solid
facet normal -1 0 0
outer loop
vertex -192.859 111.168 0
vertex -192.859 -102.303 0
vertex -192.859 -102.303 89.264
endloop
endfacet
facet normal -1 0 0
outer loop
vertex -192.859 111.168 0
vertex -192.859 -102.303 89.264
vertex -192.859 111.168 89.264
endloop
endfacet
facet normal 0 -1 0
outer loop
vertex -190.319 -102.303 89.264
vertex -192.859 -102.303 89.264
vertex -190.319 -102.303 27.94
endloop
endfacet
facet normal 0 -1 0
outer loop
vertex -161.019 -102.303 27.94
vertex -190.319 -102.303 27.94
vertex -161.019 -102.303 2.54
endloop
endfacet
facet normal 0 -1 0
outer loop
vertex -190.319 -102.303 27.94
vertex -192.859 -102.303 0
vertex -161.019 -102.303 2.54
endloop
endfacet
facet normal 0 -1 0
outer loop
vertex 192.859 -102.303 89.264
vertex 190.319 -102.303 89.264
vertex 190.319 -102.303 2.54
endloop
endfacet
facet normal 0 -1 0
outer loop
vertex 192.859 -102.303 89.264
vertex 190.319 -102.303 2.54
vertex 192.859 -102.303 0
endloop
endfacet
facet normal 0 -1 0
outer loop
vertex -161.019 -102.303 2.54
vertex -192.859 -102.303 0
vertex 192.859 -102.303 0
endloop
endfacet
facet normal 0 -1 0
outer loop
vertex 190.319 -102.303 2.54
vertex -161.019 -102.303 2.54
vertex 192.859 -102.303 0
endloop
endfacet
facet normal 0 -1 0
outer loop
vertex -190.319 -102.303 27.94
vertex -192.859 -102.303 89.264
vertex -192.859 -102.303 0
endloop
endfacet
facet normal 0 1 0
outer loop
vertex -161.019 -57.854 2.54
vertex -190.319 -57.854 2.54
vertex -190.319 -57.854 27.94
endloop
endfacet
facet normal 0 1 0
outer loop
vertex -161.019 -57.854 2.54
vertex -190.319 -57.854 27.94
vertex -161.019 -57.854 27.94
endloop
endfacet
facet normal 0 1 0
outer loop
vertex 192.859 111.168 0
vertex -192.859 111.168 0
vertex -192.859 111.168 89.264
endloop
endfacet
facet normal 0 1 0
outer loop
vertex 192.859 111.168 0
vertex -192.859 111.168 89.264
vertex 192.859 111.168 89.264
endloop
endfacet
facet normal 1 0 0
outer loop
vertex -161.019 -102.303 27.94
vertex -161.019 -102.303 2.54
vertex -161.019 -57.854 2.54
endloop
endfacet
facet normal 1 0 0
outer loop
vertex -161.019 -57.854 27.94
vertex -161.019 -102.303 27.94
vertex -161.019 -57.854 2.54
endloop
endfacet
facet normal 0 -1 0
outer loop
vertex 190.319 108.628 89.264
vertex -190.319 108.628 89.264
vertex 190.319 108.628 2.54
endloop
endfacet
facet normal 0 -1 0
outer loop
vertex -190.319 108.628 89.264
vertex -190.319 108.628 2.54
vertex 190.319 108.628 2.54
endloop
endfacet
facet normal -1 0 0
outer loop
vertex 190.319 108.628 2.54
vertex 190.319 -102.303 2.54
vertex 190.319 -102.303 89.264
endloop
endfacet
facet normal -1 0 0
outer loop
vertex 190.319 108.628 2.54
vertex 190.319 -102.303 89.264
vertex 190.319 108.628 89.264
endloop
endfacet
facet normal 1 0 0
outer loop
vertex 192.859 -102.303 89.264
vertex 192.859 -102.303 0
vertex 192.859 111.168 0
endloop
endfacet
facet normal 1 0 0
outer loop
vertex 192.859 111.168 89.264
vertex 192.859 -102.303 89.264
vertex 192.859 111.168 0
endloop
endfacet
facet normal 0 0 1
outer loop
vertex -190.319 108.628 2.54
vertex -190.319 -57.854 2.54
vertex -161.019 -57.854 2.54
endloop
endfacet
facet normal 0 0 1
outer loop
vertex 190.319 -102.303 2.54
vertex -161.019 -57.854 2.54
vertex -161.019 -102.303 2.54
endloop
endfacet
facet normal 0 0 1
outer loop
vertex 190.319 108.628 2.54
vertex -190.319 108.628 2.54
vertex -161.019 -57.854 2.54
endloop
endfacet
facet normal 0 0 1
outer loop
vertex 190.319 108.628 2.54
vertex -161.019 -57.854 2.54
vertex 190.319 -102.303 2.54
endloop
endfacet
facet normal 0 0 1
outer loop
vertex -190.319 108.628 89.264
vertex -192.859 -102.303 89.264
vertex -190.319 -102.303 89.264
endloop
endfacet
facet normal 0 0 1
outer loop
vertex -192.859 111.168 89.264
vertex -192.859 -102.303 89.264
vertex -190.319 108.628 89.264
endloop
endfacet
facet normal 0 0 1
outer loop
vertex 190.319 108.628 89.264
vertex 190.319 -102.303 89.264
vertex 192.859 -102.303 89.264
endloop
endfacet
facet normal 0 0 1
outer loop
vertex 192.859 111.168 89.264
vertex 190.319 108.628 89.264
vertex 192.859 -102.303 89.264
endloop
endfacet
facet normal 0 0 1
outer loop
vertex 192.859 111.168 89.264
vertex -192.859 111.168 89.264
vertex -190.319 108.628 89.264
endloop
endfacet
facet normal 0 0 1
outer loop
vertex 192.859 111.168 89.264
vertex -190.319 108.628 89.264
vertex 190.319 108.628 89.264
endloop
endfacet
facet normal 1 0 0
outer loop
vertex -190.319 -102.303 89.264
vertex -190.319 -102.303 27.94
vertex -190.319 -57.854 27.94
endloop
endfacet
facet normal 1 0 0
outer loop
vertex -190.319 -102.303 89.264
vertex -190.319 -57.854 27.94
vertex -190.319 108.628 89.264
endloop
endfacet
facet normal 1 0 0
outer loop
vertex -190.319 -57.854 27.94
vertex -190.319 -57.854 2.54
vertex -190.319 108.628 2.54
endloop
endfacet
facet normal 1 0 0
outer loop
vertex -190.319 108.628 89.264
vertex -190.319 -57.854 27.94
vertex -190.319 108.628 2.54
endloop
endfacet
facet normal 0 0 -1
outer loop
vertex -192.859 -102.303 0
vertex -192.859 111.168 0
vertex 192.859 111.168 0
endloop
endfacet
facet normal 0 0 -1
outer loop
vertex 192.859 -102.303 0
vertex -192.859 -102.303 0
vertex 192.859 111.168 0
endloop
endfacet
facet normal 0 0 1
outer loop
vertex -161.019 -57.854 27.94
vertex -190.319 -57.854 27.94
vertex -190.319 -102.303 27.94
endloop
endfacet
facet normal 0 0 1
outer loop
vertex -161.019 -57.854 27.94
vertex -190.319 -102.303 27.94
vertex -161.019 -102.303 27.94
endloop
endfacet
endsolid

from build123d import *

# Parameters (mm, degrees)
F0_W     = 385.718018
F0_H     = 222.336978
F1_DEPTH = 89.263966
F2_T     = -2.54
F3_W     = 385.718018
F3_H     = 89.263966
F4_DEPTH = 8.865619
F5_W     = 29.299758
F5_H     = 44.448814
F6_DEPTH = 25.4


with BuildPart() as f1:
    # F0 (on Top) → F1 (new body)
    with BuildSketch(Plane.XY):
        Rectangle(F0_W, F0_H)
    extrude(amount=F1_DEPTH)

    # F2
    f2_openings = [f1.faces().sort_by_distance(p)[0] for p in [
        (0, 0, 89.263966),
    ]]
    offset(amount=F2_T, openings=f2_openings)

    # F3 (on face) → F4 (cut)
    with BuildSketch(Plane.XZ.offset(111.168489)):
        with Locations((0, 44.631983)):
            Rectangle(F3_W, F3_H)
    extrude(amount=-F4_DEPTH, mode=Mode.SUBTRACT)

    # F5 (on face) → F6 (join)
    with BuildSketch(Plane.XY.offset(2.54)):
        with Locations((-175.66913, -80.078463)):
            Rectangle(F5_W, F5_H)
    extrude(amount=F6_DEPTH)


solid = f1.part
